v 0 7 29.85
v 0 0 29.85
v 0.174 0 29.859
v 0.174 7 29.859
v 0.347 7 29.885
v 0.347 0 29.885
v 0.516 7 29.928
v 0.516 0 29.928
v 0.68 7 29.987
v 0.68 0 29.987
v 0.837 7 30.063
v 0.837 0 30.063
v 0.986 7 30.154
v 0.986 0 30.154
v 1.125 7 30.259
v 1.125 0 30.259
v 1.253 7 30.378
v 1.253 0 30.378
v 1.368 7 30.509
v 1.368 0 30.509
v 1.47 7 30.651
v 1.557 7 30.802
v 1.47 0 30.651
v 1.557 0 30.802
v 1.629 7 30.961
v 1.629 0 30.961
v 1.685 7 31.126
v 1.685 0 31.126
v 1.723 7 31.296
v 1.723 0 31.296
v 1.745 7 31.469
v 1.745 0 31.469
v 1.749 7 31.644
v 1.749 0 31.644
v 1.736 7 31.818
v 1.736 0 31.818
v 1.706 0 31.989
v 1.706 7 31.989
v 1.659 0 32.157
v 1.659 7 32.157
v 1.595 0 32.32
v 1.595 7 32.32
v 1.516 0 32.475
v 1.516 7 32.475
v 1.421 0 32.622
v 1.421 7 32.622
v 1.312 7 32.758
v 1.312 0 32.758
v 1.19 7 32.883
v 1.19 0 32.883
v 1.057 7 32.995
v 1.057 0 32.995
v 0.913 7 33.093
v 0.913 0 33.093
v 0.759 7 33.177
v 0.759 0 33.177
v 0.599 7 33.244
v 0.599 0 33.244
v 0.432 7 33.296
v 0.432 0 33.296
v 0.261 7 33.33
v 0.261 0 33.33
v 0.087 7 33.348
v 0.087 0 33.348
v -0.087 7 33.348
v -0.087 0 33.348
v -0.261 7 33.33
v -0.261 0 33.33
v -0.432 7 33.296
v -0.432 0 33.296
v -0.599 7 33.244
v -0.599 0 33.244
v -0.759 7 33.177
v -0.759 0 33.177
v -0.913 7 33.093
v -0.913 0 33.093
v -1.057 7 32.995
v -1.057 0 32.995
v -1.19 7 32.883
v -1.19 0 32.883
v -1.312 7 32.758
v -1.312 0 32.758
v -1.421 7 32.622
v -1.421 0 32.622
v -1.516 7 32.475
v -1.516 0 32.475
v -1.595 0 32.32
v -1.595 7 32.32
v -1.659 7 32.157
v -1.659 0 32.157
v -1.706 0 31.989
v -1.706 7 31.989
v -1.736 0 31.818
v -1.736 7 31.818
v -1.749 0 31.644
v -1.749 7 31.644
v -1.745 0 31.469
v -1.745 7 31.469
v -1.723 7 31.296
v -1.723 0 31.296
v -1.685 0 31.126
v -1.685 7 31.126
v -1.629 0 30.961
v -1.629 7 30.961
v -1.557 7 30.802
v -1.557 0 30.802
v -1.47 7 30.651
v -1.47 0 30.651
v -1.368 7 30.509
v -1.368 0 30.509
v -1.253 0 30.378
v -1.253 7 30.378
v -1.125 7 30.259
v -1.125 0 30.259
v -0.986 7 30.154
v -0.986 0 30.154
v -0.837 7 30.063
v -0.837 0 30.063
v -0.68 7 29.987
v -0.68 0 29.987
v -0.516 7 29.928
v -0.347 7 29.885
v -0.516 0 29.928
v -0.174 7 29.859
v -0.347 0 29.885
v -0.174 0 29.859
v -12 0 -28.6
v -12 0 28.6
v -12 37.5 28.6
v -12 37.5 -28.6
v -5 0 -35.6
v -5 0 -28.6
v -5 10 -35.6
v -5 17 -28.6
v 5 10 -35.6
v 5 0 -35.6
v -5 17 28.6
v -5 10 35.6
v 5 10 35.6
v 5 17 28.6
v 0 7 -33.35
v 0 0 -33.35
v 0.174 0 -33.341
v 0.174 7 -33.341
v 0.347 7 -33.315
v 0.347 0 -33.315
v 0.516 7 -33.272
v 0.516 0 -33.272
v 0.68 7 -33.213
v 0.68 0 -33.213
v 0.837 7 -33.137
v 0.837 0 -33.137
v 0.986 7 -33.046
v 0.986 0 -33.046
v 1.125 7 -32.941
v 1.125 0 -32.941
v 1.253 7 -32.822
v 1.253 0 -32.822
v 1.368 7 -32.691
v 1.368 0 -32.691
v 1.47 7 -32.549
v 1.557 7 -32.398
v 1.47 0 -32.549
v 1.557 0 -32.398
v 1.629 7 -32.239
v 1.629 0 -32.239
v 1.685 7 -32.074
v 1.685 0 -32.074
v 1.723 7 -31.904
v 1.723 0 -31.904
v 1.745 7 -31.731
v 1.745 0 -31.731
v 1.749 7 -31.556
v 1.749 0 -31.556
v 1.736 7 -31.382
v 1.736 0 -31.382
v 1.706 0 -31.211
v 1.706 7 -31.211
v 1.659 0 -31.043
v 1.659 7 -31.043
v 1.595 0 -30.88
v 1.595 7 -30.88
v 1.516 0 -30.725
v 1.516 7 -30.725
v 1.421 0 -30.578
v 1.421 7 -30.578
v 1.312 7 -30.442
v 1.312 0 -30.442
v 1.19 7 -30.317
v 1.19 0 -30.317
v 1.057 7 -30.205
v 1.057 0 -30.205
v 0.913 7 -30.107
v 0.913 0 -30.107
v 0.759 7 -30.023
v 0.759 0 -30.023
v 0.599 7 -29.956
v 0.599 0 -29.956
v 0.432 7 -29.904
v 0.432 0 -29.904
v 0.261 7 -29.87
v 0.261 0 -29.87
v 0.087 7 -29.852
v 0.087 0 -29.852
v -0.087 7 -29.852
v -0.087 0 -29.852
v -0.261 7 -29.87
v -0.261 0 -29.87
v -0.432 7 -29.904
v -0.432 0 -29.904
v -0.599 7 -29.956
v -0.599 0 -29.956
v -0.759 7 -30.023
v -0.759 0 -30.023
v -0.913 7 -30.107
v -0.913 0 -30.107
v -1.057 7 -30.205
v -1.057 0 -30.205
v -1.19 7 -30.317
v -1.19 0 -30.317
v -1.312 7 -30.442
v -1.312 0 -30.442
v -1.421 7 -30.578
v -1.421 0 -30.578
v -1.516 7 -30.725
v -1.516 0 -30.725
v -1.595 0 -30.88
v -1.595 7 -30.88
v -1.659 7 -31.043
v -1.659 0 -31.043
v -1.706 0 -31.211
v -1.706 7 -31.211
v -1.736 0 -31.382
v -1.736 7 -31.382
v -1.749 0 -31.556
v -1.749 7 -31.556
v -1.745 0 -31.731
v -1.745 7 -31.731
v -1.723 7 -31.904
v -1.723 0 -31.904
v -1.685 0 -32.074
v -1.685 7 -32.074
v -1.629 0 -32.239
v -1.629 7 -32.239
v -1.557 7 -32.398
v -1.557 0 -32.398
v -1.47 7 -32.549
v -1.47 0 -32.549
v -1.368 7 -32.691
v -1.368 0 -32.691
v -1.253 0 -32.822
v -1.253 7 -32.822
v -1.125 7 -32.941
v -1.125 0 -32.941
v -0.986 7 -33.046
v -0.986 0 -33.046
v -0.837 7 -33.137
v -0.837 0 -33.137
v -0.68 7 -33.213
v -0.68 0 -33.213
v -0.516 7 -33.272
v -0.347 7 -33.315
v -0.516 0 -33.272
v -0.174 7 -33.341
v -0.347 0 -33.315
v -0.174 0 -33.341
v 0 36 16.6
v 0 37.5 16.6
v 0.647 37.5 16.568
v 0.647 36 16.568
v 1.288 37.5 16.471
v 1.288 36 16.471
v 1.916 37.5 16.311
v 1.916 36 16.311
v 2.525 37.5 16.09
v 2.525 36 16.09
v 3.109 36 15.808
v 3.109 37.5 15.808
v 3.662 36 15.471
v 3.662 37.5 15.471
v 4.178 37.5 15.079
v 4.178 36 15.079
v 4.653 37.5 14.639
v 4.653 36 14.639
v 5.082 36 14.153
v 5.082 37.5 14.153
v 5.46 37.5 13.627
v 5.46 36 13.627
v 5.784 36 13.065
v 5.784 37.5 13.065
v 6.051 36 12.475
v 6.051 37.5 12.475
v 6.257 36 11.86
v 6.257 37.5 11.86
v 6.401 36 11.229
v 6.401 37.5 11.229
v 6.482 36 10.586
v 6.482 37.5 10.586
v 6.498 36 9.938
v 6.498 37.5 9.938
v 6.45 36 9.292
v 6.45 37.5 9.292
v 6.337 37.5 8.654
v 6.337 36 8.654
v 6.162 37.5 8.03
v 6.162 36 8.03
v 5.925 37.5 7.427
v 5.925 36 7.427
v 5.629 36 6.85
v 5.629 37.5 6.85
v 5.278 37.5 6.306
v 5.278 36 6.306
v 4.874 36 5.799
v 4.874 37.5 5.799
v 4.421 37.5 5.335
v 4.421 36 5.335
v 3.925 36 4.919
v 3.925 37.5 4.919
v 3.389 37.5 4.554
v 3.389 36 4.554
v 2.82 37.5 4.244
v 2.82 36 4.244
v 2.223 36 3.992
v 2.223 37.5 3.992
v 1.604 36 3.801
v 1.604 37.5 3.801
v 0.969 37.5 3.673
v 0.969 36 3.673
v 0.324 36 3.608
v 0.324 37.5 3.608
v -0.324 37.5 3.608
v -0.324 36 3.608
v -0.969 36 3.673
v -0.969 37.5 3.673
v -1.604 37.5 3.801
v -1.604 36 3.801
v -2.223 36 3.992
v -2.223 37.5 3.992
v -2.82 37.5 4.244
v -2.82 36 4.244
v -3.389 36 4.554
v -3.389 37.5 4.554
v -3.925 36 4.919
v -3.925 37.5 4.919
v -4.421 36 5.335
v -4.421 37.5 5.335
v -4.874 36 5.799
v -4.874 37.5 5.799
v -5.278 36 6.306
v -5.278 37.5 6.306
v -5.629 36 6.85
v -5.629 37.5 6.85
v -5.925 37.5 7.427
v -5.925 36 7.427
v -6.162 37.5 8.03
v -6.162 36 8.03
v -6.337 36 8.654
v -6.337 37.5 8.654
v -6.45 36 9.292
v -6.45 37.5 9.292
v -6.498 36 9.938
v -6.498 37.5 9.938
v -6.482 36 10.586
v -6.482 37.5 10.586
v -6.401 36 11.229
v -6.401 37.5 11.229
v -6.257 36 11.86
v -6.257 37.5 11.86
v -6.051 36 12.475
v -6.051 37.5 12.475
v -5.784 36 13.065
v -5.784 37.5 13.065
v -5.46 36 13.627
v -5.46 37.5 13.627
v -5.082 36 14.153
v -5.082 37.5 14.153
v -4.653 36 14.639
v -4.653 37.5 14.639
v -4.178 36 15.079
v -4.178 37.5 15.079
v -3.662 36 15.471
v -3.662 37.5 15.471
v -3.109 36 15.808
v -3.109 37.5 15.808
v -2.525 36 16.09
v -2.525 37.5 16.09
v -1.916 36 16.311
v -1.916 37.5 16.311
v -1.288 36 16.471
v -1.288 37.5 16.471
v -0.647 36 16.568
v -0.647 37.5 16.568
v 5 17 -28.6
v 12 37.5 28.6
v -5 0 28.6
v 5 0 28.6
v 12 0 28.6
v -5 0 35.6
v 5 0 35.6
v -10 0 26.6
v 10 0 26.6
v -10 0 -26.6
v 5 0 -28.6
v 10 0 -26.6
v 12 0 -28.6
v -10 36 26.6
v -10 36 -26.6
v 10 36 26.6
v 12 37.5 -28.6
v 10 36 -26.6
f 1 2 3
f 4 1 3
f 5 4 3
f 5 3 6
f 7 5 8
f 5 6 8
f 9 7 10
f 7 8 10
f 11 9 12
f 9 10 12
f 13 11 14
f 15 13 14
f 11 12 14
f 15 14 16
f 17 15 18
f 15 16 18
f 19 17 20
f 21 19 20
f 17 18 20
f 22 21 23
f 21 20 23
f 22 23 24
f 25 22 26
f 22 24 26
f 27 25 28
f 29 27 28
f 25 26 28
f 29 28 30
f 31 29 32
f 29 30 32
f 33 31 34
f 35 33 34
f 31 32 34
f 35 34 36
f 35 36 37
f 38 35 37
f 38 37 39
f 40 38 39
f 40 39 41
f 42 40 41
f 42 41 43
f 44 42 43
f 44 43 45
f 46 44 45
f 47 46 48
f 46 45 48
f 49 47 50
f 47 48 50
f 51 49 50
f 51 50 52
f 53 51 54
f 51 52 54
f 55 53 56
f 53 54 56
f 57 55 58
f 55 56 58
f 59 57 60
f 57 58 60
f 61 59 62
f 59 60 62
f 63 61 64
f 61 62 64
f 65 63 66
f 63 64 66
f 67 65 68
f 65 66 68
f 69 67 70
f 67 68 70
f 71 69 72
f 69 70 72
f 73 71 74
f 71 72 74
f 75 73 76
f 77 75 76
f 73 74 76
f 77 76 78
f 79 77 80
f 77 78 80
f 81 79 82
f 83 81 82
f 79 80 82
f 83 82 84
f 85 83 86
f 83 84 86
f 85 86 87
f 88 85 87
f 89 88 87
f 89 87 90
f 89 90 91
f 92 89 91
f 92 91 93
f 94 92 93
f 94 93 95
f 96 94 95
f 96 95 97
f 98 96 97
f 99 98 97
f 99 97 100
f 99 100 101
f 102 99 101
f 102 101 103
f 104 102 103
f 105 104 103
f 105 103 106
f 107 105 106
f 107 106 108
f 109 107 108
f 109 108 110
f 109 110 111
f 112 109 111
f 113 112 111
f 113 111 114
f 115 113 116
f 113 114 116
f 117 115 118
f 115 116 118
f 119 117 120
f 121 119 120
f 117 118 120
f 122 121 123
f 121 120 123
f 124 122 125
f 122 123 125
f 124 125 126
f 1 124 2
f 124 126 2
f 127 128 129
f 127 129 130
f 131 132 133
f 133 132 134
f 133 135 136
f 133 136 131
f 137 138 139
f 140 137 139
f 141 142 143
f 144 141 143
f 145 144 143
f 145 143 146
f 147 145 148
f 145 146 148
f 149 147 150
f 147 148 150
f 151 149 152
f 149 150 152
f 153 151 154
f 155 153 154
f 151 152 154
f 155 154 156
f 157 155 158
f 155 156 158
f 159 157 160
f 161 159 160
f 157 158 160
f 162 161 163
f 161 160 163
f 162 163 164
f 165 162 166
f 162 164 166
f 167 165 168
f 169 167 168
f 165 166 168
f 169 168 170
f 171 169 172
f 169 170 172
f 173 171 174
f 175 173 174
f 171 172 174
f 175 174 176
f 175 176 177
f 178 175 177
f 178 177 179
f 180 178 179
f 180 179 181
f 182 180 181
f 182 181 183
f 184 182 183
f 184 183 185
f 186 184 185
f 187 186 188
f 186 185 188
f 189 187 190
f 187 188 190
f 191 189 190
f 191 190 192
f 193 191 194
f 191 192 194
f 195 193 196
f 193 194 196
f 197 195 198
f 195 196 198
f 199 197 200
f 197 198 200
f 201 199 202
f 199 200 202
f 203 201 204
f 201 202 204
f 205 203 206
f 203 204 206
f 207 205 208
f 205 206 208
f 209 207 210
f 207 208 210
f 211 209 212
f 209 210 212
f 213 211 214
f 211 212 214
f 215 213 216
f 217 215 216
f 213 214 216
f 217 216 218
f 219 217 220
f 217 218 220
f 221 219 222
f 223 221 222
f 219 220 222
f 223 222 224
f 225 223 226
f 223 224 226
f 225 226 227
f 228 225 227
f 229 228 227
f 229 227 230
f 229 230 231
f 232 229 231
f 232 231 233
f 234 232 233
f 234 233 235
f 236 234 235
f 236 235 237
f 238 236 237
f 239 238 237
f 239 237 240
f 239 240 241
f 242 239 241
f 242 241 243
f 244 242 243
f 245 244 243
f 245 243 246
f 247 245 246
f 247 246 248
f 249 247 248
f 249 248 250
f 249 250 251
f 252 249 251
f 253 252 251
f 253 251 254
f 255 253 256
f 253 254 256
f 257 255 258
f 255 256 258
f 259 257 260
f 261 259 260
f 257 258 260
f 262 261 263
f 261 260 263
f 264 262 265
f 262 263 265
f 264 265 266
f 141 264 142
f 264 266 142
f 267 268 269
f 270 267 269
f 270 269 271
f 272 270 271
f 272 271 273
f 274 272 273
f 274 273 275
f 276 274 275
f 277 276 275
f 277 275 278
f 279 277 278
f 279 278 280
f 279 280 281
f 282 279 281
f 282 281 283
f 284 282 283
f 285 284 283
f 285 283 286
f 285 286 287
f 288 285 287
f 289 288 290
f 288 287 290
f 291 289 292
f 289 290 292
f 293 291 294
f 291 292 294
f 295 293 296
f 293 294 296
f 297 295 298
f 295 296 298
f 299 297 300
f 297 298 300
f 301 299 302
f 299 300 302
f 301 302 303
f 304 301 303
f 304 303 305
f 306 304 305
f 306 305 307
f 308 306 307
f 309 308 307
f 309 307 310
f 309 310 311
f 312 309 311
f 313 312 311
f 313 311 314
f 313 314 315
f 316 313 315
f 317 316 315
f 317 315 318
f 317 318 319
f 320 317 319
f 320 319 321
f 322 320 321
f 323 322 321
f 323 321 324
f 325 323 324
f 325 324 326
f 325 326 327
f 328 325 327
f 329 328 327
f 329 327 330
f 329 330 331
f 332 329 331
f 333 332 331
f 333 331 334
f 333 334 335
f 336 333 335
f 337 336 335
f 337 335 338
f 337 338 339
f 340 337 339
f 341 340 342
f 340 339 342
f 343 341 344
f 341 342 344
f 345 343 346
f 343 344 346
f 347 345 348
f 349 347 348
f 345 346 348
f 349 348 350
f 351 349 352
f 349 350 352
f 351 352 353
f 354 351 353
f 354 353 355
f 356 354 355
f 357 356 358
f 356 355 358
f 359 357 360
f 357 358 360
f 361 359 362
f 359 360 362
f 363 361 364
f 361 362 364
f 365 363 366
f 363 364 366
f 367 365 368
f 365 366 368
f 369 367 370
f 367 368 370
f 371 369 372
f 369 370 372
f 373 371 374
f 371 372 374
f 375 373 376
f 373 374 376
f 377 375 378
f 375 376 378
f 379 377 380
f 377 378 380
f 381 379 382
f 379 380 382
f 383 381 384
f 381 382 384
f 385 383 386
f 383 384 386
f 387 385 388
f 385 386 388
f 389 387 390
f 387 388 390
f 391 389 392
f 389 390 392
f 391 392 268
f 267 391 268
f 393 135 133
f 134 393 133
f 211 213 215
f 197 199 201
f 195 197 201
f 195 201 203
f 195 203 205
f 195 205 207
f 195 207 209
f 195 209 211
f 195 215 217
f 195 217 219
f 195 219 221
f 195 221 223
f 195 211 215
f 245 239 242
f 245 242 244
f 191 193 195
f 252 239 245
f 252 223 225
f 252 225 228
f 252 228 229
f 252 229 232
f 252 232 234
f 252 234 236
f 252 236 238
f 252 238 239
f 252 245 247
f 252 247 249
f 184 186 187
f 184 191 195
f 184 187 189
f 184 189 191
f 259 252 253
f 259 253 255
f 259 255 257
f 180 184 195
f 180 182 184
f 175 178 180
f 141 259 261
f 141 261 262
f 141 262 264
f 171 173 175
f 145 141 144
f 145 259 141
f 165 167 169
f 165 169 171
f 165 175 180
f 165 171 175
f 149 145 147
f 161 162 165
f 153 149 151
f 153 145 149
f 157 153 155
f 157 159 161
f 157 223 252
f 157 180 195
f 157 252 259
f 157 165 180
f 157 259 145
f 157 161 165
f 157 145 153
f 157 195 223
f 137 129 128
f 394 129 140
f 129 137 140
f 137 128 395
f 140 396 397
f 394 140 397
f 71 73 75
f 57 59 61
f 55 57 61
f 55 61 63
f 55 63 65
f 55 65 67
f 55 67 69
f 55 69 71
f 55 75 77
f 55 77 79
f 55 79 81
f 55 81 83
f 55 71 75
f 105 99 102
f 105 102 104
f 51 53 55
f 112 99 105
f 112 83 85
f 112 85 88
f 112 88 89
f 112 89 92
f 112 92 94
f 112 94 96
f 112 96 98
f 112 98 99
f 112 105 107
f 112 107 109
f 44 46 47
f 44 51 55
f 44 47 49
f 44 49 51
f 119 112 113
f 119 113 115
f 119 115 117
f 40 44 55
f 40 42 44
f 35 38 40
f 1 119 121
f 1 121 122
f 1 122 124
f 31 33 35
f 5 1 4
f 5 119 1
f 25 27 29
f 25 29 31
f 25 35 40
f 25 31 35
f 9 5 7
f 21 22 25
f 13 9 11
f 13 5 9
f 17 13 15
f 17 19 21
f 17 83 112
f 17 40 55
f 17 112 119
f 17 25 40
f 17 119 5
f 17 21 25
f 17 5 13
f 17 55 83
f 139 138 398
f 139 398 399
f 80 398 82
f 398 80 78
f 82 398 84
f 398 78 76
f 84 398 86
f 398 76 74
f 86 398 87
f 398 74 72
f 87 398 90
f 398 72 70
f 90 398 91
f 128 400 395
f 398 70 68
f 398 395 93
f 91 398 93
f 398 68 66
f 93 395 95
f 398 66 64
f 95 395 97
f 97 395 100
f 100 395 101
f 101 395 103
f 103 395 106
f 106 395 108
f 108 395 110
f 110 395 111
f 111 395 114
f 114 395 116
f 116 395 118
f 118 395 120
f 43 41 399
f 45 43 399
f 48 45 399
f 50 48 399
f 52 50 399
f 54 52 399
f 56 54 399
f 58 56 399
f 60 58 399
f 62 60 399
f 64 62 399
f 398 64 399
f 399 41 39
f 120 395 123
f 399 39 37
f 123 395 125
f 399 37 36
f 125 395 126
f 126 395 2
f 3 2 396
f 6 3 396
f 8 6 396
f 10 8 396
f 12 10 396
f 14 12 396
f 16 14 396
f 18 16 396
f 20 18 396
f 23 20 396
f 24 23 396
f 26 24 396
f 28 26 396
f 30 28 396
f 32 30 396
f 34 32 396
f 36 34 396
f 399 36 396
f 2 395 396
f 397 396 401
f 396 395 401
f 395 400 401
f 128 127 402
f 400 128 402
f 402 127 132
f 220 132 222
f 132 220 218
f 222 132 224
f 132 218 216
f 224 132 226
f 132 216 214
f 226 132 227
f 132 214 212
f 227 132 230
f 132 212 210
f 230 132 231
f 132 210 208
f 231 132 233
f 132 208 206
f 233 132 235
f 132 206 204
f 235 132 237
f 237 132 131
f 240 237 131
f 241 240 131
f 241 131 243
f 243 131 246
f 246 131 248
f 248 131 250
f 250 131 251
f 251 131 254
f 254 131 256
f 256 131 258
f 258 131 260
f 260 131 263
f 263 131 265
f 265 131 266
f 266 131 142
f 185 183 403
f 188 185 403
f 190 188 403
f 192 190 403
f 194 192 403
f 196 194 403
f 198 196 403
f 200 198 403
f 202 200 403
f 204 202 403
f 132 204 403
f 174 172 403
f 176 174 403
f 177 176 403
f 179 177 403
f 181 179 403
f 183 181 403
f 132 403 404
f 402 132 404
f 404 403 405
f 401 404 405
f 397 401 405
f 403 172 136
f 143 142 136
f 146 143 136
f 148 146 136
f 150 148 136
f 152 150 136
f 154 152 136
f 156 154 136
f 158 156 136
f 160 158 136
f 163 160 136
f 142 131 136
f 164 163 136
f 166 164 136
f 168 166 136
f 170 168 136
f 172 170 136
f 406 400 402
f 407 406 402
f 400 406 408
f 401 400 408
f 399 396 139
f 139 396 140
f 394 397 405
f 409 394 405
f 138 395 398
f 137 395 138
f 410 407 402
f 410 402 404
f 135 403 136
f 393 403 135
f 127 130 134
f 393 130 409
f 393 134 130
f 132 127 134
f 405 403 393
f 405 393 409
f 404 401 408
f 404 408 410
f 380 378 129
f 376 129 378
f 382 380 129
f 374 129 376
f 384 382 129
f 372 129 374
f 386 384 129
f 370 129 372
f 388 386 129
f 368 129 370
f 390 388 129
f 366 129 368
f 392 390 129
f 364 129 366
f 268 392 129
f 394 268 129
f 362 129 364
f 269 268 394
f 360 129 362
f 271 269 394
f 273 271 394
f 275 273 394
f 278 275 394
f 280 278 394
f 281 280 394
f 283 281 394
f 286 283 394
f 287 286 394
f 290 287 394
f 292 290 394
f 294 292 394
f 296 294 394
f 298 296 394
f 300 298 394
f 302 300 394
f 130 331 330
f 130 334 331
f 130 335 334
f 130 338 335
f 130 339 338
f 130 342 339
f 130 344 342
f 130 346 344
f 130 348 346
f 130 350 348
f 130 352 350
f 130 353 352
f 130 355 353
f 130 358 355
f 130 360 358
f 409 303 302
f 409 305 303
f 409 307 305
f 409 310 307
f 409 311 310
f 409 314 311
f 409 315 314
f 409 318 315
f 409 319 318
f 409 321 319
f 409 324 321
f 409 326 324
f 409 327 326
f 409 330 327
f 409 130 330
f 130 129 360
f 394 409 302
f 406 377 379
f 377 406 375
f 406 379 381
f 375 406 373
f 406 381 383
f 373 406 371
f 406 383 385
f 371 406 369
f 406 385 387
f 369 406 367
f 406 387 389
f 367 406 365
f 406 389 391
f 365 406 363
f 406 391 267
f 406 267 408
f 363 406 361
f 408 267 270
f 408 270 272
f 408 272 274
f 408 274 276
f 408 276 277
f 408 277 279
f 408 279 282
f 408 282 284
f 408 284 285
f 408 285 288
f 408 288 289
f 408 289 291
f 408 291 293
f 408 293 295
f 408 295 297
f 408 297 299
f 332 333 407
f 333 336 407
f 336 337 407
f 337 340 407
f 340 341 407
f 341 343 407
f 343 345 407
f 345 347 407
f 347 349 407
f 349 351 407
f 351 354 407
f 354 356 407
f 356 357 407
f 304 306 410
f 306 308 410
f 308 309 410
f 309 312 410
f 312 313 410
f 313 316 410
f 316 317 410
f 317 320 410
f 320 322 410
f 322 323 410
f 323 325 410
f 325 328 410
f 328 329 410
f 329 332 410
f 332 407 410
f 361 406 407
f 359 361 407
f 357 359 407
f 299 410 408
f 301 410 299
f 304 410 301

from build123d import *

# Parameters (mm, degrees)
SKETCH1_W           = 20
SKETCH1_H           = 53.2
BOSS_EXTRUDE1_DEPTH = 36
SHELL1_T            = 2
SKETCH2_R           = 6.5
CUT_EXTRUDE1_DEPTH  = 5
SKETCH3_W           = 10
SKETCH3_H           = 10
BOSS_EXTRUDE2_DEPTH = 7
SKETCH4_W           = 10
SKETCH4_H           = 10
BOSS_EXTRUDE3_DEPTH = 7
SKETCH5_R           = 1.75
CUT_EXTRUDE2_DEPTH  = 7
CHAMFER1_SIZE       = 7
SKETCH6_W           = 29.413997259
SKETCH6_H           = 62.11470898
CUT_EXTRUDE3_DEPTH  = 0.5


with BuildPart() as part:
    # Sketch1 → Boss-Extrude1 (new body)
    with BuildSketch(Plane(origin=(0, 0, 0), x_dir=(1, 0, 0), z_dir=(0, 1, 0))):
        Rectangle(SKETCH1_W, SKETCH1_H)
    extrude(amount=BOSS_EXTRUDE1_DEPTH)

    # Shell1
    shell1_openings = [part.faces().sort_by_distance(p)[0] for p in [
        (0, 0, 0),
    ]]
    offset(amount=SHELL1_T, openings=shell1_openings, kind=Kind.INTERSECTION)

    # Sketch2 → Cut-Extrude1 (cut)
    with BuildSketch(Plane(origin=(0, 38, 0), x_dir=(1, 0, 0), z_dir=(0, 1, 0))):
        with Locations(Location((0, -10.1, 0), (0, 0, 270))):
            Circle(SKETCH2_R)
    extrude(amount=-CUT_EXTRUDE1_DEPTH, mode=Mode.SUBTRACT)

    # Sketch3 → Boss-Extrude2 (add)
    with BuildSketch(Plane(origin=(0, 0, -28.6), x_dir=(-1, 0, 0), z_dir=(0, 0, -1))):
        with Locations((0, 5)):
            Rectangle(SKETCH3_W, SKETCH3_H)
    extrude(amount=BOSS_EXTRUDE2_DEPTH)

    # Sketch4 → Boss-Extrude3 (add)
    with BuildSketch(Plane.XY.offset(28.6)):
        with Locations((0, 5)):
            Rectangle(SKETCH4_W, SKETCH4_H)
    extrude(amount=BOSS_EXTRUDE3_DEPTH)

    # Sketch5 → Cut-Extrude2 (cut)
    with BuildSketch(Plane.XZ):
        with Locations(Location((0, 31.6, 0), (0, 0, 270))):
            Circle(SKETCH5_R)
        with Locations(Location((0, -31.6, 0), (0, 0, 270))):
            Circle(SKETCH5_R)
    extrude(amount=-CUT_EXTRUDE2_DEPTH, mode=Mode.SUBTRACT)

    # Chamfer1
    chamfer1_edges = [part.edges().sort_by_distance(p)[0] for p in [
        (0, 10, -28.6),
        (0, 10, 28.6),
    ]]
    chamfer(chamfer1_edges, length=CHAMFER1_SIZE - 0.0001)  # a hair under: the kernel refuses the full size

    # Sketch6 → Cut-Extrude3 (cut)
    with BuildSketch(Plane(origin=(0, 38, 0), x_dir=(1, 0, 0), z_dir=(0, 1, 0))):
        with Locations((0.367646398, -0.2519266)):
            Rectangle(SKETCH6_W, SKETCH6_H)
    extrude(amount=-CUT_EXTRUDE3_DEPTH, mode=Mode.SUBTRACT)


solid = part.part
